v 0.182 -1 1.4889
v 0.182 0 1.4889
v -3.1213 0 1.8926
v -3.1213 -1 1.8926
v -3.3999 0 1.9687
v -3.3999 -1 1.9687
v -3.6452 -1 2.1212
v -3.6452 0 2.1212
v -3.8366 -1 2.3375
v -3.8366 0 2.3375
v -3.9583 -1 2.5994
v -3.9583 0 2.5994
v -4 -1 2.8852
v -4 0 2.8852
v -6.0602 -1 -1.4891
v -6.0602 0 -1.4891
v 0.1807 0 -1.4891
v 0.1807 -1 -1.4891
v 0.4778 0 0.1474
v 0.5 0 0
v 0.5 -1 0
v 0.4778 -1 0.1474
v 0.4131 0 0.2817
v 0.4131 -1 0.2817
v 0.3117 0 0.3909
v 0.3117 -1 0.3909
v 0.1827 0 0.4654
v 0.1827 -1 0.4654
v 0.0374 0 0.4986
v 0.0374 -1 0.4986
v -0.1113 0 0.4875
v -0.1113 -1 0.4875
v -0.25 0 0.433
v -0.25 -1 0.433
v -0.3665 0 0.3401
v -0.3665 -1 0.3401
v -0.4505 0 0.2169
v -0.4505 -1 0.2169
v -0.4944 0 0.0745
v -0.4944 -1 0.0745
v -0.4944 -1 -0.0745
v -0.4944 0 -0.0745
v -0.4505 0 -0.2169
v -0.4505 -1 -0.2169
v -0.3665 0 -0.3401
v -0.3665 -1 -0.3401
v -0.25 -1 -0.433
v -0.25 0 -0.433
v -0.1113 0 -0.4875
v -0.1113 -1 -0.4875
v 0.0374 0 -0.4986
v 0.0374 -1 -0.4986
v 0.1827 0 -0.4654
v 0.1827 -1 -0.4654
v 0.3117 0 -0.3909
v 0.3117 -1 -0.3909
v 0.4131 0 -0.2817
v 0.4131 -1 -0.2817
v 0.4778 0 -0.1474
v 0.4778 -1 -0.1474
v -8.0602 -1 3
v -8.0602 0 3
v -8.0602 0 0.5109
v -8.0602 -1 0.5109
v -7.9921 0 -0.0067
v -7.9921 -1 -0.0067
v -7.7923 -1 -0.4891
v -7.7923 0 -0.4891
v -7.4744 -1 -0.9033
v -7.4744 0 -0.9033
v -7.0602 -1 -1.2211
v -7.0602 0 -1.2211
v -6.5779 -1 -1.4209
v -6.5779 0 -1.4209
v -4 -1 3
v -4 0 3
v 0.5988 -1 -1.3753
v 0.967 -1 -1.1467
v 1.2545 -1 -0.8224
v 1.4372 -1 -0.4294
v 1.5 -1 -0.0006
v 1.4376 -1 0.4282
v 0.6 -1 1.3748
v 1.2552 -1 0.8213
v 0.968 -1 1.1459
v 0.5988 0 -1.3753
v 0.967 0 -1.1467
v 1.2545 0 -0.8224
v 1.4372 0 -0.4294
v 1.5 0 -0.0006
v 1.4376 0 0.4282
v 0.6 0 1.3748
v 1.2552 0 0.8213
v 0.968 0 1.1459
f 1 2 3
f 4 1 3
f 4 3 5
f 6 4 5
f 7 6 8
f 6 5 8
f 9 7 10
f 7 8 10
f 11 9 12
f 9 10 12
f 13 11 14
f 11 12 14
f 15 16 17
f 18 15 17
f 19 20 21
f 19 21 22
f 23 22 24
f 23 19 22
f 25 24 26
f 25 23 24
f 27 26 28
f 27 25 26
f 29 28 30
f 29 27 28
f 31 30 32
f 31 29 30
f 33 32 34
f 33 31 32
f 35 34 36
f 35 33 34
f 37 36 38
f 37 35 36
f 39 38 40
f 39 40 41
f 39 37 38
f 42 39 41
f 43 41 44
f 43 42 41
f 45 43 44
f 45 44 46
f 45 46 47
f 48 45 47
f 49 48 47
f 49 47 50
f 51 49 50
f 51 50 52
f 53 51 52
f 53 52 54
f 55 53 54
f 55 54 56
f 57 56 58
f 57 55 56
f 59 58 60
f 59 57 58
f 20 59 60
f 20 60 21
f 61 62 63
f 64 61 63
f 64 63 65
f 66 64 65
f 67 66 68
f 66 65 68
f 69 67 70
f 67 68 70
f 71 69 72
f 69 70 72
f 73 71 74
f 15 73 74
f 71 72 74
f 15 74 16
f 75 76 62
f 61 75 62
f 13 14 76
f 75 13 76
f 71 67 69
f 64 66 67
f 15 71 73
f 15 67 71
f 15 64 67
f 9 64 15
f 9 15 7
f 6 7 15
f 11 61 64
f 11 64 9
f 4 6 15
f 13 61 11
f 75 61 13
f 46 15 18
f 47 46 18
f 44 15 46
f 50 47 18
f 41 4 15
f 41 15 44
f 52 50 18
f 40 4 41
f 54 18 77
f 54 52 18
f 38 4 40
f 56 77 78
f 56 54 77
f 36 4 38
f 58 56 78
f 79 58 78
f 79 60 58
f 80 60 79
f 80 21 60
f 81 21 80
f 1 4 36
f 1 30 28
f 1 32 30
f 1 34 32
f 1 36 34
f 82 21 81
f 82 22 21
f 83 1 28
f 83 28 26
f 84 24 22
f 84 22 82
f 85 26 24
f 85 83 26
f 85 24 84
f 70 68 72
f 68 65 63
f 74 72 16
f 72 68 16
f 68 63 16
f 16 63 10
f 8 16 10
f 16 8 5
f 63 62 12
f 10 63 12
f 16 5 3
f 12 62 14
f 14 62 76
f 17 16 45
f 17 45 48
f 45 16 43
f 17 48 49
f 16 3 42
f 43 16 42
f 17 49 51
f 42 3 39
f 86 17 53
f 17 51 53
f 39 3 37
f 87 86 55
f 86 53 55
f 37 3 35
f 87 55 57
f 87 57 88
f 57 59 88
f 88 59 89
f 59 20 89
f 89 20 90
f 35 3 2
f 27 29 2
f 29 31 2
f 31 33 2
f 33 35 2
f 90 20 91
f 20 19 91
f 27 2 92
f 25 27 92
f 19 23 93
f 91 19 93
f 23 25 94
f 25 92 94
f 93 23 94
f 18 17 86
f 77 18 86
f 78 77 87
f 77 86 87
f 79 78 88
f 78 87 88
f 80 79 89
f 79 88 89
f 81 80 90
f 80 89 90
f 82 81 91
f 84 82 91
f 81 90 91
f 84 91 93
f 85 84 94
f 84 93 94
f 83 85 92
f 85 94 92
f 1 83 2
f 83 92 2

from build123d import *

# Parameters (mm, degrees)
F0_R     = 0.5
F1_DEPTH = 1


with BuildPart() as f1:
    # F0 (on Front) → F1 (new body)
    with BuildSketch(Plane.XZ):
        with BuildLine():
            Line((-6.060225, -1.489079), (0.180674, -1.489079))
            ThreePointArc((0.180674, -1.489079), (1.5, -0.000648), (0.181961, 1.488922))
            Line((0.181961, 1.488922), (-3.121307, 1.892615))
            ThreePointArc((-3.121307, 1.892615), (-3.748768, 2.222398), (-4, 2.88523))
            Line((-4, 2.88523), (-4, 3))
            Line((-4, 3), (-8.060225, 3))
            Line((-8.060225, 3), (-8.060225, 0.510921))
            ThreePointArc((-8.060225, 0.510921), (-7.474438, -0.903293), (-6.060225, -1.489079))
        make_face()
        Circle(F0_R, mode=Mode.SUBTRACT)
    extrude(amount=F1_DEPTH)


solid = f1.part
